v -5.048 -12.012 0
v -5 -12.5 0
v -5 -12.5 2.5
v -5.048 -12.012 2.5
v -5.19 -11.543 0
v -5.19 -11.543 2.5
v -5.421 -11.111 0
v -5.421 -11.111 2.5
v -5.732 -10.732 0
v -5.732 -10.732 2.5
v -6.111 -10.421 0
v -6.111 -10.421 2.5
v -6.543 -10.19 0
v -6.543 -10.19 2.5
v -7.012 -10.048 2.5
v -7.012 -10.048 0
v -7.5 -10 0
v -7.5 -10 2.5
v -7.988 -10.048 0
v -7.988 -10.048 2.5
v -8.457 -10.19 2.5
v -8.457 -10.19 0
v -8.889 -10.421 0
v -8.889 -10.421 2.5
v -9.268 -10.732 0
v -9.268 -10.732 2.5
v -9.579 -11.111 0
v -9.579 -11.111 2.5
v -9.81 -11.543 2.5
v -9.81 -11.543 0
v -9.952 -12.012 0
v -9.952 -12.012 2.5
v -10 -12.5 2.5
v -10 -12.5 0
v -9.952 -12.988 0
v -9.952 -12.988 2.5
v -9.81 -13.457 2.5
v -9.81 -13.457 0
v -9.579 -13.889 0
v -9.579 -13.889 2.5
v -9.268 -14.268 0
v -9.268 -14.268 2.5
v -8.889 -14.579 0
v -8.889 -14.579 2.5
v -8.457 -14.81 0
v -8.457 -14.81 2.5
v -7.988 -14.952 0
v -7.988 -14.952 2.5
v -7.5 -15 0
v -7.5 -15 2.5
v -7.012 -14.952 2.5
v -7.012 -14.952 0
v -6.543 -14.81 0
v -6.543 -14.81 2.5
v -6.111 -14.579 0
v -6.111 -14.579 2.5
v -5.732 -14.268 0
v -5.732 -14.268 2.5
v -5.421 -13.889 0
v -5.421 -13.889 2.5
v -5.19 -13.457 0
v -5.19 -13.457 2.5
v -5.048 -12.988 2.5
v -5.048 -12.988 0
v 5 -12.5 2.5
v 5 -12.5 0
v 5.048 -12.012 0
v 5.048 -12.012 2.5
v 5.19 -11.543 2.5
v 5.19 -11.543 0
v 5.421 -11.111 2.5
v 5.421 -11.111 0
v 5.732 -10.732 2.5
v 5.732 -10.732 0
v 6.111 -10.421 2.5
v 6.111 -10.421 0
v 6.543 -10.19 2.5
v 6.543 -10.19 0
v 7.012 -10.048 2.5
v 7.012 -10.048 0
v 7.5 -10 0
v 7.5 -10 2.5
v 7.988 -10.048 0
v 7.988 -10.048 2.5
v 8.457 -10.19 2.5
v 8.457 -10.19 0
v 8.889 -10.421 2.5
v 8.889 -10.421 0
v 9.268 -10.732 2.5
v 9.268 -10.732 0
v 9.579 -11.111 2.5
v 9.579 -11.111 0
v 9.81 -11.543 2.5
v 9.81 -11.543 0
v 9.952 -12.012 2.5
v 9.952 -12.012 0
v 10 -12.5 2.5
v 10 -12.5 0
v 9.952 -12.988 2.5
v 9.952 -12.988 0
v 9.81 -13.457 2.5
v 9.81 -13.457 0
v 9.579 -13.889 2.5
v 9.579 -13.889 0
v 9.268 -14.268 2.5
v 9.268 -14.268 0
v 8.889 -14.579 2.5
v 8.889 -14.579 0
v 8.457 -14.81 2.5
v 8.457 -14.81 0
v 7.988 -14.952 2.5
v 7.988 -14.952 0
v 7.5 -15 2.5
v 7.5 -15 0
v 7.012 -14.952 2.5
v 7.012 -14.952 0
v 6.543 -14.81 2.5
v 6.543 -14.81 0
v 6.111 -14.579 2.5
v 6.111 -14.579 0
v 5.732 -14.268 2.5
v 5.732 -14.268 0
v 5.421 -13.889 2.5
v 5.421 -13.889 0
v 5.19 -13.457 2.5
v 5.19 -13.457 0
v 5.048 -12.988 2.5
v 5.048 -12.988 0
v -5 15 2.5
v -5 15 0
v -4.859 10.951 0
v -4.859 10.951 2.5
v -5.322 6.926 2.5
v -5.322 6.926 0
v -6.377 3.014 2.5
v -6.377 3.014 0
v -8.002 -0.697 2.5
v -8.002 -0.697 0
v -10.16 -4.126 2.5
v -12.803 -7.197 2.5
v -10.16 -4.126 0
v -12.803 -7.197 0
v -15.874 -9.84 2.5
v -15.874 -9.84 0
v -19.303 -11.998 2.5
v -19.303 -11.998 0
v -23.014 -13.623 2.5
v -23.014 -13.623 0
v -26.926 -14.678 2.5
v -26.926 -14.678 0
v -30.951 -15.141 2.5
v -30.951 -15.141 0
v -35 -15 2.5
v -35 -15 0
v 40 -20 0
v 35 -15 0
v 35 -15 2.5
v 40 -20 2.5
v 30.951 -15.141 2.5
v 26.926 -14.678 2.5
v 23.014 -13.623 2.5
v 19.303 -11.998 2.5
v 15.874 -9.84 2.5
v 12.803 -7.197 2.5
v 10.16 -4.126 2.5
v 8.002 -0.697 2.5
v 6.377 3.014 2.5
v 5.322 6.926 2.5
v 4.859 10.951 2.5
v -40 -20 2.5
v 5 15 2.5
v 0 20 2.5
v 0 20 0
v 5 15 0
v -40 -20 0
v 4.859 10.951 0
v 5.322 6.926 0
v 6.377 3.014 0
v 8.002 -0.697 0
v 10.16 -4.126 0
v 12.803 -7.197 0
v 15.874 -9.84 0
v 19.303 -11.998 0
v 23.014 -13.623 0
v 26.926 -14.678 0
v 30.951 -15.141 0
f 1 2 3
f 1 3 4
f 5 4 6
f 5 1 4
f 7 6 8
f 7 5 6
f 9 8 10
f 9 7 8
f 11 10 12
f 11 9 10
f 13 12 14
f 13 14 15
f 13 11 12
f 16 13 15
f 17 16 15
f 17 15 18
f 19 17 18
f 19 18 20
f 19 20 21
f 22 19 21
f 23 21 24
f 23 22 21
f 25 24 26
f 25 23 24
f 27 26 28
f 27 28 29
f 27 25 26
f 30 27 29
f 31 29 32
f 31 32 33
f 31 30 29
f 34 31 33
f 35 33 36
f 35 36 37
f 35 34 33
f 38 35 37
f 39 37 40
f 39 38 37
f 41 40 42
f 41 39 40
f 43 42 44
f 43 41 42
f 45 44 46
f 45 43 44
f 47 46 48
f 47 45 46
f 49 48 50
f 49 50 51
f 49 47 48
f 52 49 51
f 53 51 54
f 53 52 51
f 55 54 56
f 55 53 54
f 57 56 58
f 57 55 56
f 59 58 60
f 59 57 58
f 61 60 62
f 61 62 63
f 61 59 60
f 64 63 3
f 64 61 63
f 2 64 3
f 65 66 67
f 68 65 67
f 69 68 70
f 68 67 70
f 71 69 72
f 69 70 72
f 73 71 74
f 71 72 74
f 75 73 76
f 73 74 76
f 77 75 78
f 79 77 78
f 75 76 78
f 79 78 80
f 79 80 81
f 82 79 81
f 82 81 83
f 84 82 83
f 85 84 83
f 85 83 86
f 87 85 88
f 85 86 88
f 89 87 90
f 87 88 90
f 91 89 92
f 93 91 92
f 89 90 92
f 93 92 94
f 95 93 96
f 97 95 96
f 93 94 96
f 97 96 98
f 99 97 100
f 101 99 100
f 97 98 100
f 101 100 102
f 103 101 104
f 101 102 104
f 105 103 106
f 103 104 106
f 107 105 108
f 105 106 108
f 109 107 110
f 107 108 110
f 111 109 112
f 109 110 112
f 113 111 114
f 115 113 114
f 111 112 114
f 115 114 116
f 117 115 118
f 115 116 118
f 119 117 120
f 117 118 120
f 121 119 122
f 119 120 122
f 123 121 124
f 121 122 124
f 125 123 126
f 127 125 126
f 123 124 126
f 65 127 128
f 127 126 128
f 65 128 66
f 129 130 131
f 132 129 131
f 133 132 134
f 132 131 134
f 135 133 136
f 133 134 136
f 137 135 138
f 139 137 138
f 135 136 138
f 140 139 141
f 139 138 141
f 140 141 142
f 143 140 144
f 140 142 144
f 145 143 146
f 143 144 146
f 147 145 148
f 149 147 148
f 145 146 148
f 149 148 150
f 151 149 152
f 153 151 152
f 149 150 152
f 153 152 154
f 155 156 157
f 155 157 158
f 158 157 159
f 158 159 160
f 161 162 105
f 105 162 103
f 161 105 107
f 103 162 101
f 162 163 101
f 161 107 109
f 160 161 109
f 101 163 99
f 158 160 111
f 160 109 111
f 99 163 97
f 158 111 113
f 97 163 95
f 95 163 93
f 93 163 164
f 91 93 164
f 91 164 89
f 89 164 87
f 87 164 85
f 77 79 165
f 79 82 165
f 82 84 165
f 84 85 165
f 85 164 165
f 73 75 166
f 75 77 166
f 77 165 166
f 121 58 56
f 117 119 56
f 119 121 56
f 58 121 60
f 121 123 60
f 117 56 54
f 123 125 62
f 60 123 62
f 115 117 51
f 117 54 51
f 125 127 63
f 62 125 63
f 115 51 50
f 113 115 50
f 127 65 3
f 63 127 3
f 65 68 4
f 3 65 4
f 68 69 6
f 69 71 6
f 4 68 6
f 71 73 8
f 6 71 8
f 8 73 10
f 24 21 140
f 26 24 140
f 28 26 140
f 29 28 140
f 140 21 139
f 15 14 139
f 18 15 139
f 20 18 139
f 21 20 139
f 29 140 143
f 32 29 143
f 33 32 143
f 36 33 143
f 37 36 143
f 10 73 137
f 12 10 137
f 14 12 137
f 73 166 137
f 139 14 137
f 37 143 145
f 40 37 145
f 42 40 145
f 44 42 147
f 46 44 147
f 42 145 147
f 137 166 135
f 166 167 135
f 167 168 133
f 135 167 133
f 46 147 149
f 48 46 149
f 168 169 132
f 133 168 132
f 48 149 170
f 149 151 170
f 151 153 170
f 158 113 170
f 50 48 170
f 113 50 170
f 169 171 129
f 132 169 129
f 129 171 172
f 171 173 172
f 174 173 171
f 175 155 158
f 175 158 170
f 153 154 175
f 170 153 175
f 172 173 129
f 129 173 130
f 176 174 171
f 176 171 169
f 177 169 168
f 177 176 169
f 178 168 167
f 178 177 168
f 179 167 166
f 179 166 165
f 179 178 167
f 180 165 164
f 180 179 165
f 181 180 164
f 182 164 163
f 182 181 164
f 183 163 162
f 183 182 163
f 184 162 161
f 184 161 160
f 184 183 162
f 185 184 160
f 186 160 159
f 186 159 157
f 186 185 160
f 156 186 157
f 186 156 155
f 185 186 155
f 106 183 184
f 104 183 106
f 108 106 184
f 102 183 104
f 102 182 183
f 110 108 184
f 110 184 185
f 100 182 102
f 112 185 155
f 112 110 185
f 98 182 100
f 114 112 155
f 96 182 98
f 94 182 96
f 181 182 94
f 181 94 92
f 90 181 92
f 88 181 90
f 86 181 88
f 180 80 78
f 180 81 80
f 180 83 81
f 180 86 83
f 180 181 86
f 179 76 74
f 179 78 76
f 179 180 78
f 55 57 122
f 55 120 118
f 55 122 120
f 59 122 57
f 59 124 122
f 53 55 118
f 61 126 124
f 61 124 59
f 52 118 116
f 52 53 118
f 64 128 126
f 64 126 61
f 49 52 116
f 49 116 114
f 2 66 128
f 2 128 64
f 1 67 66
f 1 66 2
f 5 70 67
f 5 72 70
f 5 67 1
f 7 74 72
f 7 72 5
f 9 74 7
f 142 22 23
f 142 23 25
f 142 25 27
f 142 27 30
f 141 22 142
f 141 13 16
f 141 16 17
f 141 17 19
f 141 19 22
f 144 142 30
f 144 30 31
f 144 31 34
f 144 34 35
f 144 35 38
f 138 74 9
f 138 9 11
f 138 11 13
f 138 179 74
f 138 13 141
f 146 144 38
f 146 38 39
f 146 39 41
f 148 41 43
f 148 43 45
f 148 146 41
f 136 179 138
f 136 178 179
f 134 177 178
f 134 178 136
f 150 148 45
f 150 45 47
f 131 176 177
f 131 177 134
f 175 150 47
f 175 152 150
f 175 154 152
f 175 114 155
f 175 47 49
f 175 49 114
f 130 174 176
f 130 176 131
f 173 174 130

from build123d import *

# Parameters (mm, degrees)
F0_R     = 2.5
F1_DEPTH = 2.5


with BuildPart() as f1:
    # F0 (on Top) → F1 (new body)
    with BuildSketch(Plane.XY):
        with BuildLine():
            Line((0, -20), (0, 20))
            Line((0, 20), (-5, 15))
            ThreePointArc((-5, 15), (-12.803301, -7.196699), (-35, -15))
            Line((-35, -15), (-40, -20))
            Line((-40, -20), (0, -20))
        make_face()
        with Locations((-7.5, -12.5)):
            Circle(F0_R, mode=Mode.SUBTRACT)
    extrude(amount=F1_DEPTH)

    # F2: F1 across face


with BuildPart() as f1_1:
    add(f1.part)
    add(f1.part.mirror(Plane(origin=(0, 0, 1.25), x_dir=(0, 1, 0), z_dir=(1, 0, 0))))


solid = f1_1.part
